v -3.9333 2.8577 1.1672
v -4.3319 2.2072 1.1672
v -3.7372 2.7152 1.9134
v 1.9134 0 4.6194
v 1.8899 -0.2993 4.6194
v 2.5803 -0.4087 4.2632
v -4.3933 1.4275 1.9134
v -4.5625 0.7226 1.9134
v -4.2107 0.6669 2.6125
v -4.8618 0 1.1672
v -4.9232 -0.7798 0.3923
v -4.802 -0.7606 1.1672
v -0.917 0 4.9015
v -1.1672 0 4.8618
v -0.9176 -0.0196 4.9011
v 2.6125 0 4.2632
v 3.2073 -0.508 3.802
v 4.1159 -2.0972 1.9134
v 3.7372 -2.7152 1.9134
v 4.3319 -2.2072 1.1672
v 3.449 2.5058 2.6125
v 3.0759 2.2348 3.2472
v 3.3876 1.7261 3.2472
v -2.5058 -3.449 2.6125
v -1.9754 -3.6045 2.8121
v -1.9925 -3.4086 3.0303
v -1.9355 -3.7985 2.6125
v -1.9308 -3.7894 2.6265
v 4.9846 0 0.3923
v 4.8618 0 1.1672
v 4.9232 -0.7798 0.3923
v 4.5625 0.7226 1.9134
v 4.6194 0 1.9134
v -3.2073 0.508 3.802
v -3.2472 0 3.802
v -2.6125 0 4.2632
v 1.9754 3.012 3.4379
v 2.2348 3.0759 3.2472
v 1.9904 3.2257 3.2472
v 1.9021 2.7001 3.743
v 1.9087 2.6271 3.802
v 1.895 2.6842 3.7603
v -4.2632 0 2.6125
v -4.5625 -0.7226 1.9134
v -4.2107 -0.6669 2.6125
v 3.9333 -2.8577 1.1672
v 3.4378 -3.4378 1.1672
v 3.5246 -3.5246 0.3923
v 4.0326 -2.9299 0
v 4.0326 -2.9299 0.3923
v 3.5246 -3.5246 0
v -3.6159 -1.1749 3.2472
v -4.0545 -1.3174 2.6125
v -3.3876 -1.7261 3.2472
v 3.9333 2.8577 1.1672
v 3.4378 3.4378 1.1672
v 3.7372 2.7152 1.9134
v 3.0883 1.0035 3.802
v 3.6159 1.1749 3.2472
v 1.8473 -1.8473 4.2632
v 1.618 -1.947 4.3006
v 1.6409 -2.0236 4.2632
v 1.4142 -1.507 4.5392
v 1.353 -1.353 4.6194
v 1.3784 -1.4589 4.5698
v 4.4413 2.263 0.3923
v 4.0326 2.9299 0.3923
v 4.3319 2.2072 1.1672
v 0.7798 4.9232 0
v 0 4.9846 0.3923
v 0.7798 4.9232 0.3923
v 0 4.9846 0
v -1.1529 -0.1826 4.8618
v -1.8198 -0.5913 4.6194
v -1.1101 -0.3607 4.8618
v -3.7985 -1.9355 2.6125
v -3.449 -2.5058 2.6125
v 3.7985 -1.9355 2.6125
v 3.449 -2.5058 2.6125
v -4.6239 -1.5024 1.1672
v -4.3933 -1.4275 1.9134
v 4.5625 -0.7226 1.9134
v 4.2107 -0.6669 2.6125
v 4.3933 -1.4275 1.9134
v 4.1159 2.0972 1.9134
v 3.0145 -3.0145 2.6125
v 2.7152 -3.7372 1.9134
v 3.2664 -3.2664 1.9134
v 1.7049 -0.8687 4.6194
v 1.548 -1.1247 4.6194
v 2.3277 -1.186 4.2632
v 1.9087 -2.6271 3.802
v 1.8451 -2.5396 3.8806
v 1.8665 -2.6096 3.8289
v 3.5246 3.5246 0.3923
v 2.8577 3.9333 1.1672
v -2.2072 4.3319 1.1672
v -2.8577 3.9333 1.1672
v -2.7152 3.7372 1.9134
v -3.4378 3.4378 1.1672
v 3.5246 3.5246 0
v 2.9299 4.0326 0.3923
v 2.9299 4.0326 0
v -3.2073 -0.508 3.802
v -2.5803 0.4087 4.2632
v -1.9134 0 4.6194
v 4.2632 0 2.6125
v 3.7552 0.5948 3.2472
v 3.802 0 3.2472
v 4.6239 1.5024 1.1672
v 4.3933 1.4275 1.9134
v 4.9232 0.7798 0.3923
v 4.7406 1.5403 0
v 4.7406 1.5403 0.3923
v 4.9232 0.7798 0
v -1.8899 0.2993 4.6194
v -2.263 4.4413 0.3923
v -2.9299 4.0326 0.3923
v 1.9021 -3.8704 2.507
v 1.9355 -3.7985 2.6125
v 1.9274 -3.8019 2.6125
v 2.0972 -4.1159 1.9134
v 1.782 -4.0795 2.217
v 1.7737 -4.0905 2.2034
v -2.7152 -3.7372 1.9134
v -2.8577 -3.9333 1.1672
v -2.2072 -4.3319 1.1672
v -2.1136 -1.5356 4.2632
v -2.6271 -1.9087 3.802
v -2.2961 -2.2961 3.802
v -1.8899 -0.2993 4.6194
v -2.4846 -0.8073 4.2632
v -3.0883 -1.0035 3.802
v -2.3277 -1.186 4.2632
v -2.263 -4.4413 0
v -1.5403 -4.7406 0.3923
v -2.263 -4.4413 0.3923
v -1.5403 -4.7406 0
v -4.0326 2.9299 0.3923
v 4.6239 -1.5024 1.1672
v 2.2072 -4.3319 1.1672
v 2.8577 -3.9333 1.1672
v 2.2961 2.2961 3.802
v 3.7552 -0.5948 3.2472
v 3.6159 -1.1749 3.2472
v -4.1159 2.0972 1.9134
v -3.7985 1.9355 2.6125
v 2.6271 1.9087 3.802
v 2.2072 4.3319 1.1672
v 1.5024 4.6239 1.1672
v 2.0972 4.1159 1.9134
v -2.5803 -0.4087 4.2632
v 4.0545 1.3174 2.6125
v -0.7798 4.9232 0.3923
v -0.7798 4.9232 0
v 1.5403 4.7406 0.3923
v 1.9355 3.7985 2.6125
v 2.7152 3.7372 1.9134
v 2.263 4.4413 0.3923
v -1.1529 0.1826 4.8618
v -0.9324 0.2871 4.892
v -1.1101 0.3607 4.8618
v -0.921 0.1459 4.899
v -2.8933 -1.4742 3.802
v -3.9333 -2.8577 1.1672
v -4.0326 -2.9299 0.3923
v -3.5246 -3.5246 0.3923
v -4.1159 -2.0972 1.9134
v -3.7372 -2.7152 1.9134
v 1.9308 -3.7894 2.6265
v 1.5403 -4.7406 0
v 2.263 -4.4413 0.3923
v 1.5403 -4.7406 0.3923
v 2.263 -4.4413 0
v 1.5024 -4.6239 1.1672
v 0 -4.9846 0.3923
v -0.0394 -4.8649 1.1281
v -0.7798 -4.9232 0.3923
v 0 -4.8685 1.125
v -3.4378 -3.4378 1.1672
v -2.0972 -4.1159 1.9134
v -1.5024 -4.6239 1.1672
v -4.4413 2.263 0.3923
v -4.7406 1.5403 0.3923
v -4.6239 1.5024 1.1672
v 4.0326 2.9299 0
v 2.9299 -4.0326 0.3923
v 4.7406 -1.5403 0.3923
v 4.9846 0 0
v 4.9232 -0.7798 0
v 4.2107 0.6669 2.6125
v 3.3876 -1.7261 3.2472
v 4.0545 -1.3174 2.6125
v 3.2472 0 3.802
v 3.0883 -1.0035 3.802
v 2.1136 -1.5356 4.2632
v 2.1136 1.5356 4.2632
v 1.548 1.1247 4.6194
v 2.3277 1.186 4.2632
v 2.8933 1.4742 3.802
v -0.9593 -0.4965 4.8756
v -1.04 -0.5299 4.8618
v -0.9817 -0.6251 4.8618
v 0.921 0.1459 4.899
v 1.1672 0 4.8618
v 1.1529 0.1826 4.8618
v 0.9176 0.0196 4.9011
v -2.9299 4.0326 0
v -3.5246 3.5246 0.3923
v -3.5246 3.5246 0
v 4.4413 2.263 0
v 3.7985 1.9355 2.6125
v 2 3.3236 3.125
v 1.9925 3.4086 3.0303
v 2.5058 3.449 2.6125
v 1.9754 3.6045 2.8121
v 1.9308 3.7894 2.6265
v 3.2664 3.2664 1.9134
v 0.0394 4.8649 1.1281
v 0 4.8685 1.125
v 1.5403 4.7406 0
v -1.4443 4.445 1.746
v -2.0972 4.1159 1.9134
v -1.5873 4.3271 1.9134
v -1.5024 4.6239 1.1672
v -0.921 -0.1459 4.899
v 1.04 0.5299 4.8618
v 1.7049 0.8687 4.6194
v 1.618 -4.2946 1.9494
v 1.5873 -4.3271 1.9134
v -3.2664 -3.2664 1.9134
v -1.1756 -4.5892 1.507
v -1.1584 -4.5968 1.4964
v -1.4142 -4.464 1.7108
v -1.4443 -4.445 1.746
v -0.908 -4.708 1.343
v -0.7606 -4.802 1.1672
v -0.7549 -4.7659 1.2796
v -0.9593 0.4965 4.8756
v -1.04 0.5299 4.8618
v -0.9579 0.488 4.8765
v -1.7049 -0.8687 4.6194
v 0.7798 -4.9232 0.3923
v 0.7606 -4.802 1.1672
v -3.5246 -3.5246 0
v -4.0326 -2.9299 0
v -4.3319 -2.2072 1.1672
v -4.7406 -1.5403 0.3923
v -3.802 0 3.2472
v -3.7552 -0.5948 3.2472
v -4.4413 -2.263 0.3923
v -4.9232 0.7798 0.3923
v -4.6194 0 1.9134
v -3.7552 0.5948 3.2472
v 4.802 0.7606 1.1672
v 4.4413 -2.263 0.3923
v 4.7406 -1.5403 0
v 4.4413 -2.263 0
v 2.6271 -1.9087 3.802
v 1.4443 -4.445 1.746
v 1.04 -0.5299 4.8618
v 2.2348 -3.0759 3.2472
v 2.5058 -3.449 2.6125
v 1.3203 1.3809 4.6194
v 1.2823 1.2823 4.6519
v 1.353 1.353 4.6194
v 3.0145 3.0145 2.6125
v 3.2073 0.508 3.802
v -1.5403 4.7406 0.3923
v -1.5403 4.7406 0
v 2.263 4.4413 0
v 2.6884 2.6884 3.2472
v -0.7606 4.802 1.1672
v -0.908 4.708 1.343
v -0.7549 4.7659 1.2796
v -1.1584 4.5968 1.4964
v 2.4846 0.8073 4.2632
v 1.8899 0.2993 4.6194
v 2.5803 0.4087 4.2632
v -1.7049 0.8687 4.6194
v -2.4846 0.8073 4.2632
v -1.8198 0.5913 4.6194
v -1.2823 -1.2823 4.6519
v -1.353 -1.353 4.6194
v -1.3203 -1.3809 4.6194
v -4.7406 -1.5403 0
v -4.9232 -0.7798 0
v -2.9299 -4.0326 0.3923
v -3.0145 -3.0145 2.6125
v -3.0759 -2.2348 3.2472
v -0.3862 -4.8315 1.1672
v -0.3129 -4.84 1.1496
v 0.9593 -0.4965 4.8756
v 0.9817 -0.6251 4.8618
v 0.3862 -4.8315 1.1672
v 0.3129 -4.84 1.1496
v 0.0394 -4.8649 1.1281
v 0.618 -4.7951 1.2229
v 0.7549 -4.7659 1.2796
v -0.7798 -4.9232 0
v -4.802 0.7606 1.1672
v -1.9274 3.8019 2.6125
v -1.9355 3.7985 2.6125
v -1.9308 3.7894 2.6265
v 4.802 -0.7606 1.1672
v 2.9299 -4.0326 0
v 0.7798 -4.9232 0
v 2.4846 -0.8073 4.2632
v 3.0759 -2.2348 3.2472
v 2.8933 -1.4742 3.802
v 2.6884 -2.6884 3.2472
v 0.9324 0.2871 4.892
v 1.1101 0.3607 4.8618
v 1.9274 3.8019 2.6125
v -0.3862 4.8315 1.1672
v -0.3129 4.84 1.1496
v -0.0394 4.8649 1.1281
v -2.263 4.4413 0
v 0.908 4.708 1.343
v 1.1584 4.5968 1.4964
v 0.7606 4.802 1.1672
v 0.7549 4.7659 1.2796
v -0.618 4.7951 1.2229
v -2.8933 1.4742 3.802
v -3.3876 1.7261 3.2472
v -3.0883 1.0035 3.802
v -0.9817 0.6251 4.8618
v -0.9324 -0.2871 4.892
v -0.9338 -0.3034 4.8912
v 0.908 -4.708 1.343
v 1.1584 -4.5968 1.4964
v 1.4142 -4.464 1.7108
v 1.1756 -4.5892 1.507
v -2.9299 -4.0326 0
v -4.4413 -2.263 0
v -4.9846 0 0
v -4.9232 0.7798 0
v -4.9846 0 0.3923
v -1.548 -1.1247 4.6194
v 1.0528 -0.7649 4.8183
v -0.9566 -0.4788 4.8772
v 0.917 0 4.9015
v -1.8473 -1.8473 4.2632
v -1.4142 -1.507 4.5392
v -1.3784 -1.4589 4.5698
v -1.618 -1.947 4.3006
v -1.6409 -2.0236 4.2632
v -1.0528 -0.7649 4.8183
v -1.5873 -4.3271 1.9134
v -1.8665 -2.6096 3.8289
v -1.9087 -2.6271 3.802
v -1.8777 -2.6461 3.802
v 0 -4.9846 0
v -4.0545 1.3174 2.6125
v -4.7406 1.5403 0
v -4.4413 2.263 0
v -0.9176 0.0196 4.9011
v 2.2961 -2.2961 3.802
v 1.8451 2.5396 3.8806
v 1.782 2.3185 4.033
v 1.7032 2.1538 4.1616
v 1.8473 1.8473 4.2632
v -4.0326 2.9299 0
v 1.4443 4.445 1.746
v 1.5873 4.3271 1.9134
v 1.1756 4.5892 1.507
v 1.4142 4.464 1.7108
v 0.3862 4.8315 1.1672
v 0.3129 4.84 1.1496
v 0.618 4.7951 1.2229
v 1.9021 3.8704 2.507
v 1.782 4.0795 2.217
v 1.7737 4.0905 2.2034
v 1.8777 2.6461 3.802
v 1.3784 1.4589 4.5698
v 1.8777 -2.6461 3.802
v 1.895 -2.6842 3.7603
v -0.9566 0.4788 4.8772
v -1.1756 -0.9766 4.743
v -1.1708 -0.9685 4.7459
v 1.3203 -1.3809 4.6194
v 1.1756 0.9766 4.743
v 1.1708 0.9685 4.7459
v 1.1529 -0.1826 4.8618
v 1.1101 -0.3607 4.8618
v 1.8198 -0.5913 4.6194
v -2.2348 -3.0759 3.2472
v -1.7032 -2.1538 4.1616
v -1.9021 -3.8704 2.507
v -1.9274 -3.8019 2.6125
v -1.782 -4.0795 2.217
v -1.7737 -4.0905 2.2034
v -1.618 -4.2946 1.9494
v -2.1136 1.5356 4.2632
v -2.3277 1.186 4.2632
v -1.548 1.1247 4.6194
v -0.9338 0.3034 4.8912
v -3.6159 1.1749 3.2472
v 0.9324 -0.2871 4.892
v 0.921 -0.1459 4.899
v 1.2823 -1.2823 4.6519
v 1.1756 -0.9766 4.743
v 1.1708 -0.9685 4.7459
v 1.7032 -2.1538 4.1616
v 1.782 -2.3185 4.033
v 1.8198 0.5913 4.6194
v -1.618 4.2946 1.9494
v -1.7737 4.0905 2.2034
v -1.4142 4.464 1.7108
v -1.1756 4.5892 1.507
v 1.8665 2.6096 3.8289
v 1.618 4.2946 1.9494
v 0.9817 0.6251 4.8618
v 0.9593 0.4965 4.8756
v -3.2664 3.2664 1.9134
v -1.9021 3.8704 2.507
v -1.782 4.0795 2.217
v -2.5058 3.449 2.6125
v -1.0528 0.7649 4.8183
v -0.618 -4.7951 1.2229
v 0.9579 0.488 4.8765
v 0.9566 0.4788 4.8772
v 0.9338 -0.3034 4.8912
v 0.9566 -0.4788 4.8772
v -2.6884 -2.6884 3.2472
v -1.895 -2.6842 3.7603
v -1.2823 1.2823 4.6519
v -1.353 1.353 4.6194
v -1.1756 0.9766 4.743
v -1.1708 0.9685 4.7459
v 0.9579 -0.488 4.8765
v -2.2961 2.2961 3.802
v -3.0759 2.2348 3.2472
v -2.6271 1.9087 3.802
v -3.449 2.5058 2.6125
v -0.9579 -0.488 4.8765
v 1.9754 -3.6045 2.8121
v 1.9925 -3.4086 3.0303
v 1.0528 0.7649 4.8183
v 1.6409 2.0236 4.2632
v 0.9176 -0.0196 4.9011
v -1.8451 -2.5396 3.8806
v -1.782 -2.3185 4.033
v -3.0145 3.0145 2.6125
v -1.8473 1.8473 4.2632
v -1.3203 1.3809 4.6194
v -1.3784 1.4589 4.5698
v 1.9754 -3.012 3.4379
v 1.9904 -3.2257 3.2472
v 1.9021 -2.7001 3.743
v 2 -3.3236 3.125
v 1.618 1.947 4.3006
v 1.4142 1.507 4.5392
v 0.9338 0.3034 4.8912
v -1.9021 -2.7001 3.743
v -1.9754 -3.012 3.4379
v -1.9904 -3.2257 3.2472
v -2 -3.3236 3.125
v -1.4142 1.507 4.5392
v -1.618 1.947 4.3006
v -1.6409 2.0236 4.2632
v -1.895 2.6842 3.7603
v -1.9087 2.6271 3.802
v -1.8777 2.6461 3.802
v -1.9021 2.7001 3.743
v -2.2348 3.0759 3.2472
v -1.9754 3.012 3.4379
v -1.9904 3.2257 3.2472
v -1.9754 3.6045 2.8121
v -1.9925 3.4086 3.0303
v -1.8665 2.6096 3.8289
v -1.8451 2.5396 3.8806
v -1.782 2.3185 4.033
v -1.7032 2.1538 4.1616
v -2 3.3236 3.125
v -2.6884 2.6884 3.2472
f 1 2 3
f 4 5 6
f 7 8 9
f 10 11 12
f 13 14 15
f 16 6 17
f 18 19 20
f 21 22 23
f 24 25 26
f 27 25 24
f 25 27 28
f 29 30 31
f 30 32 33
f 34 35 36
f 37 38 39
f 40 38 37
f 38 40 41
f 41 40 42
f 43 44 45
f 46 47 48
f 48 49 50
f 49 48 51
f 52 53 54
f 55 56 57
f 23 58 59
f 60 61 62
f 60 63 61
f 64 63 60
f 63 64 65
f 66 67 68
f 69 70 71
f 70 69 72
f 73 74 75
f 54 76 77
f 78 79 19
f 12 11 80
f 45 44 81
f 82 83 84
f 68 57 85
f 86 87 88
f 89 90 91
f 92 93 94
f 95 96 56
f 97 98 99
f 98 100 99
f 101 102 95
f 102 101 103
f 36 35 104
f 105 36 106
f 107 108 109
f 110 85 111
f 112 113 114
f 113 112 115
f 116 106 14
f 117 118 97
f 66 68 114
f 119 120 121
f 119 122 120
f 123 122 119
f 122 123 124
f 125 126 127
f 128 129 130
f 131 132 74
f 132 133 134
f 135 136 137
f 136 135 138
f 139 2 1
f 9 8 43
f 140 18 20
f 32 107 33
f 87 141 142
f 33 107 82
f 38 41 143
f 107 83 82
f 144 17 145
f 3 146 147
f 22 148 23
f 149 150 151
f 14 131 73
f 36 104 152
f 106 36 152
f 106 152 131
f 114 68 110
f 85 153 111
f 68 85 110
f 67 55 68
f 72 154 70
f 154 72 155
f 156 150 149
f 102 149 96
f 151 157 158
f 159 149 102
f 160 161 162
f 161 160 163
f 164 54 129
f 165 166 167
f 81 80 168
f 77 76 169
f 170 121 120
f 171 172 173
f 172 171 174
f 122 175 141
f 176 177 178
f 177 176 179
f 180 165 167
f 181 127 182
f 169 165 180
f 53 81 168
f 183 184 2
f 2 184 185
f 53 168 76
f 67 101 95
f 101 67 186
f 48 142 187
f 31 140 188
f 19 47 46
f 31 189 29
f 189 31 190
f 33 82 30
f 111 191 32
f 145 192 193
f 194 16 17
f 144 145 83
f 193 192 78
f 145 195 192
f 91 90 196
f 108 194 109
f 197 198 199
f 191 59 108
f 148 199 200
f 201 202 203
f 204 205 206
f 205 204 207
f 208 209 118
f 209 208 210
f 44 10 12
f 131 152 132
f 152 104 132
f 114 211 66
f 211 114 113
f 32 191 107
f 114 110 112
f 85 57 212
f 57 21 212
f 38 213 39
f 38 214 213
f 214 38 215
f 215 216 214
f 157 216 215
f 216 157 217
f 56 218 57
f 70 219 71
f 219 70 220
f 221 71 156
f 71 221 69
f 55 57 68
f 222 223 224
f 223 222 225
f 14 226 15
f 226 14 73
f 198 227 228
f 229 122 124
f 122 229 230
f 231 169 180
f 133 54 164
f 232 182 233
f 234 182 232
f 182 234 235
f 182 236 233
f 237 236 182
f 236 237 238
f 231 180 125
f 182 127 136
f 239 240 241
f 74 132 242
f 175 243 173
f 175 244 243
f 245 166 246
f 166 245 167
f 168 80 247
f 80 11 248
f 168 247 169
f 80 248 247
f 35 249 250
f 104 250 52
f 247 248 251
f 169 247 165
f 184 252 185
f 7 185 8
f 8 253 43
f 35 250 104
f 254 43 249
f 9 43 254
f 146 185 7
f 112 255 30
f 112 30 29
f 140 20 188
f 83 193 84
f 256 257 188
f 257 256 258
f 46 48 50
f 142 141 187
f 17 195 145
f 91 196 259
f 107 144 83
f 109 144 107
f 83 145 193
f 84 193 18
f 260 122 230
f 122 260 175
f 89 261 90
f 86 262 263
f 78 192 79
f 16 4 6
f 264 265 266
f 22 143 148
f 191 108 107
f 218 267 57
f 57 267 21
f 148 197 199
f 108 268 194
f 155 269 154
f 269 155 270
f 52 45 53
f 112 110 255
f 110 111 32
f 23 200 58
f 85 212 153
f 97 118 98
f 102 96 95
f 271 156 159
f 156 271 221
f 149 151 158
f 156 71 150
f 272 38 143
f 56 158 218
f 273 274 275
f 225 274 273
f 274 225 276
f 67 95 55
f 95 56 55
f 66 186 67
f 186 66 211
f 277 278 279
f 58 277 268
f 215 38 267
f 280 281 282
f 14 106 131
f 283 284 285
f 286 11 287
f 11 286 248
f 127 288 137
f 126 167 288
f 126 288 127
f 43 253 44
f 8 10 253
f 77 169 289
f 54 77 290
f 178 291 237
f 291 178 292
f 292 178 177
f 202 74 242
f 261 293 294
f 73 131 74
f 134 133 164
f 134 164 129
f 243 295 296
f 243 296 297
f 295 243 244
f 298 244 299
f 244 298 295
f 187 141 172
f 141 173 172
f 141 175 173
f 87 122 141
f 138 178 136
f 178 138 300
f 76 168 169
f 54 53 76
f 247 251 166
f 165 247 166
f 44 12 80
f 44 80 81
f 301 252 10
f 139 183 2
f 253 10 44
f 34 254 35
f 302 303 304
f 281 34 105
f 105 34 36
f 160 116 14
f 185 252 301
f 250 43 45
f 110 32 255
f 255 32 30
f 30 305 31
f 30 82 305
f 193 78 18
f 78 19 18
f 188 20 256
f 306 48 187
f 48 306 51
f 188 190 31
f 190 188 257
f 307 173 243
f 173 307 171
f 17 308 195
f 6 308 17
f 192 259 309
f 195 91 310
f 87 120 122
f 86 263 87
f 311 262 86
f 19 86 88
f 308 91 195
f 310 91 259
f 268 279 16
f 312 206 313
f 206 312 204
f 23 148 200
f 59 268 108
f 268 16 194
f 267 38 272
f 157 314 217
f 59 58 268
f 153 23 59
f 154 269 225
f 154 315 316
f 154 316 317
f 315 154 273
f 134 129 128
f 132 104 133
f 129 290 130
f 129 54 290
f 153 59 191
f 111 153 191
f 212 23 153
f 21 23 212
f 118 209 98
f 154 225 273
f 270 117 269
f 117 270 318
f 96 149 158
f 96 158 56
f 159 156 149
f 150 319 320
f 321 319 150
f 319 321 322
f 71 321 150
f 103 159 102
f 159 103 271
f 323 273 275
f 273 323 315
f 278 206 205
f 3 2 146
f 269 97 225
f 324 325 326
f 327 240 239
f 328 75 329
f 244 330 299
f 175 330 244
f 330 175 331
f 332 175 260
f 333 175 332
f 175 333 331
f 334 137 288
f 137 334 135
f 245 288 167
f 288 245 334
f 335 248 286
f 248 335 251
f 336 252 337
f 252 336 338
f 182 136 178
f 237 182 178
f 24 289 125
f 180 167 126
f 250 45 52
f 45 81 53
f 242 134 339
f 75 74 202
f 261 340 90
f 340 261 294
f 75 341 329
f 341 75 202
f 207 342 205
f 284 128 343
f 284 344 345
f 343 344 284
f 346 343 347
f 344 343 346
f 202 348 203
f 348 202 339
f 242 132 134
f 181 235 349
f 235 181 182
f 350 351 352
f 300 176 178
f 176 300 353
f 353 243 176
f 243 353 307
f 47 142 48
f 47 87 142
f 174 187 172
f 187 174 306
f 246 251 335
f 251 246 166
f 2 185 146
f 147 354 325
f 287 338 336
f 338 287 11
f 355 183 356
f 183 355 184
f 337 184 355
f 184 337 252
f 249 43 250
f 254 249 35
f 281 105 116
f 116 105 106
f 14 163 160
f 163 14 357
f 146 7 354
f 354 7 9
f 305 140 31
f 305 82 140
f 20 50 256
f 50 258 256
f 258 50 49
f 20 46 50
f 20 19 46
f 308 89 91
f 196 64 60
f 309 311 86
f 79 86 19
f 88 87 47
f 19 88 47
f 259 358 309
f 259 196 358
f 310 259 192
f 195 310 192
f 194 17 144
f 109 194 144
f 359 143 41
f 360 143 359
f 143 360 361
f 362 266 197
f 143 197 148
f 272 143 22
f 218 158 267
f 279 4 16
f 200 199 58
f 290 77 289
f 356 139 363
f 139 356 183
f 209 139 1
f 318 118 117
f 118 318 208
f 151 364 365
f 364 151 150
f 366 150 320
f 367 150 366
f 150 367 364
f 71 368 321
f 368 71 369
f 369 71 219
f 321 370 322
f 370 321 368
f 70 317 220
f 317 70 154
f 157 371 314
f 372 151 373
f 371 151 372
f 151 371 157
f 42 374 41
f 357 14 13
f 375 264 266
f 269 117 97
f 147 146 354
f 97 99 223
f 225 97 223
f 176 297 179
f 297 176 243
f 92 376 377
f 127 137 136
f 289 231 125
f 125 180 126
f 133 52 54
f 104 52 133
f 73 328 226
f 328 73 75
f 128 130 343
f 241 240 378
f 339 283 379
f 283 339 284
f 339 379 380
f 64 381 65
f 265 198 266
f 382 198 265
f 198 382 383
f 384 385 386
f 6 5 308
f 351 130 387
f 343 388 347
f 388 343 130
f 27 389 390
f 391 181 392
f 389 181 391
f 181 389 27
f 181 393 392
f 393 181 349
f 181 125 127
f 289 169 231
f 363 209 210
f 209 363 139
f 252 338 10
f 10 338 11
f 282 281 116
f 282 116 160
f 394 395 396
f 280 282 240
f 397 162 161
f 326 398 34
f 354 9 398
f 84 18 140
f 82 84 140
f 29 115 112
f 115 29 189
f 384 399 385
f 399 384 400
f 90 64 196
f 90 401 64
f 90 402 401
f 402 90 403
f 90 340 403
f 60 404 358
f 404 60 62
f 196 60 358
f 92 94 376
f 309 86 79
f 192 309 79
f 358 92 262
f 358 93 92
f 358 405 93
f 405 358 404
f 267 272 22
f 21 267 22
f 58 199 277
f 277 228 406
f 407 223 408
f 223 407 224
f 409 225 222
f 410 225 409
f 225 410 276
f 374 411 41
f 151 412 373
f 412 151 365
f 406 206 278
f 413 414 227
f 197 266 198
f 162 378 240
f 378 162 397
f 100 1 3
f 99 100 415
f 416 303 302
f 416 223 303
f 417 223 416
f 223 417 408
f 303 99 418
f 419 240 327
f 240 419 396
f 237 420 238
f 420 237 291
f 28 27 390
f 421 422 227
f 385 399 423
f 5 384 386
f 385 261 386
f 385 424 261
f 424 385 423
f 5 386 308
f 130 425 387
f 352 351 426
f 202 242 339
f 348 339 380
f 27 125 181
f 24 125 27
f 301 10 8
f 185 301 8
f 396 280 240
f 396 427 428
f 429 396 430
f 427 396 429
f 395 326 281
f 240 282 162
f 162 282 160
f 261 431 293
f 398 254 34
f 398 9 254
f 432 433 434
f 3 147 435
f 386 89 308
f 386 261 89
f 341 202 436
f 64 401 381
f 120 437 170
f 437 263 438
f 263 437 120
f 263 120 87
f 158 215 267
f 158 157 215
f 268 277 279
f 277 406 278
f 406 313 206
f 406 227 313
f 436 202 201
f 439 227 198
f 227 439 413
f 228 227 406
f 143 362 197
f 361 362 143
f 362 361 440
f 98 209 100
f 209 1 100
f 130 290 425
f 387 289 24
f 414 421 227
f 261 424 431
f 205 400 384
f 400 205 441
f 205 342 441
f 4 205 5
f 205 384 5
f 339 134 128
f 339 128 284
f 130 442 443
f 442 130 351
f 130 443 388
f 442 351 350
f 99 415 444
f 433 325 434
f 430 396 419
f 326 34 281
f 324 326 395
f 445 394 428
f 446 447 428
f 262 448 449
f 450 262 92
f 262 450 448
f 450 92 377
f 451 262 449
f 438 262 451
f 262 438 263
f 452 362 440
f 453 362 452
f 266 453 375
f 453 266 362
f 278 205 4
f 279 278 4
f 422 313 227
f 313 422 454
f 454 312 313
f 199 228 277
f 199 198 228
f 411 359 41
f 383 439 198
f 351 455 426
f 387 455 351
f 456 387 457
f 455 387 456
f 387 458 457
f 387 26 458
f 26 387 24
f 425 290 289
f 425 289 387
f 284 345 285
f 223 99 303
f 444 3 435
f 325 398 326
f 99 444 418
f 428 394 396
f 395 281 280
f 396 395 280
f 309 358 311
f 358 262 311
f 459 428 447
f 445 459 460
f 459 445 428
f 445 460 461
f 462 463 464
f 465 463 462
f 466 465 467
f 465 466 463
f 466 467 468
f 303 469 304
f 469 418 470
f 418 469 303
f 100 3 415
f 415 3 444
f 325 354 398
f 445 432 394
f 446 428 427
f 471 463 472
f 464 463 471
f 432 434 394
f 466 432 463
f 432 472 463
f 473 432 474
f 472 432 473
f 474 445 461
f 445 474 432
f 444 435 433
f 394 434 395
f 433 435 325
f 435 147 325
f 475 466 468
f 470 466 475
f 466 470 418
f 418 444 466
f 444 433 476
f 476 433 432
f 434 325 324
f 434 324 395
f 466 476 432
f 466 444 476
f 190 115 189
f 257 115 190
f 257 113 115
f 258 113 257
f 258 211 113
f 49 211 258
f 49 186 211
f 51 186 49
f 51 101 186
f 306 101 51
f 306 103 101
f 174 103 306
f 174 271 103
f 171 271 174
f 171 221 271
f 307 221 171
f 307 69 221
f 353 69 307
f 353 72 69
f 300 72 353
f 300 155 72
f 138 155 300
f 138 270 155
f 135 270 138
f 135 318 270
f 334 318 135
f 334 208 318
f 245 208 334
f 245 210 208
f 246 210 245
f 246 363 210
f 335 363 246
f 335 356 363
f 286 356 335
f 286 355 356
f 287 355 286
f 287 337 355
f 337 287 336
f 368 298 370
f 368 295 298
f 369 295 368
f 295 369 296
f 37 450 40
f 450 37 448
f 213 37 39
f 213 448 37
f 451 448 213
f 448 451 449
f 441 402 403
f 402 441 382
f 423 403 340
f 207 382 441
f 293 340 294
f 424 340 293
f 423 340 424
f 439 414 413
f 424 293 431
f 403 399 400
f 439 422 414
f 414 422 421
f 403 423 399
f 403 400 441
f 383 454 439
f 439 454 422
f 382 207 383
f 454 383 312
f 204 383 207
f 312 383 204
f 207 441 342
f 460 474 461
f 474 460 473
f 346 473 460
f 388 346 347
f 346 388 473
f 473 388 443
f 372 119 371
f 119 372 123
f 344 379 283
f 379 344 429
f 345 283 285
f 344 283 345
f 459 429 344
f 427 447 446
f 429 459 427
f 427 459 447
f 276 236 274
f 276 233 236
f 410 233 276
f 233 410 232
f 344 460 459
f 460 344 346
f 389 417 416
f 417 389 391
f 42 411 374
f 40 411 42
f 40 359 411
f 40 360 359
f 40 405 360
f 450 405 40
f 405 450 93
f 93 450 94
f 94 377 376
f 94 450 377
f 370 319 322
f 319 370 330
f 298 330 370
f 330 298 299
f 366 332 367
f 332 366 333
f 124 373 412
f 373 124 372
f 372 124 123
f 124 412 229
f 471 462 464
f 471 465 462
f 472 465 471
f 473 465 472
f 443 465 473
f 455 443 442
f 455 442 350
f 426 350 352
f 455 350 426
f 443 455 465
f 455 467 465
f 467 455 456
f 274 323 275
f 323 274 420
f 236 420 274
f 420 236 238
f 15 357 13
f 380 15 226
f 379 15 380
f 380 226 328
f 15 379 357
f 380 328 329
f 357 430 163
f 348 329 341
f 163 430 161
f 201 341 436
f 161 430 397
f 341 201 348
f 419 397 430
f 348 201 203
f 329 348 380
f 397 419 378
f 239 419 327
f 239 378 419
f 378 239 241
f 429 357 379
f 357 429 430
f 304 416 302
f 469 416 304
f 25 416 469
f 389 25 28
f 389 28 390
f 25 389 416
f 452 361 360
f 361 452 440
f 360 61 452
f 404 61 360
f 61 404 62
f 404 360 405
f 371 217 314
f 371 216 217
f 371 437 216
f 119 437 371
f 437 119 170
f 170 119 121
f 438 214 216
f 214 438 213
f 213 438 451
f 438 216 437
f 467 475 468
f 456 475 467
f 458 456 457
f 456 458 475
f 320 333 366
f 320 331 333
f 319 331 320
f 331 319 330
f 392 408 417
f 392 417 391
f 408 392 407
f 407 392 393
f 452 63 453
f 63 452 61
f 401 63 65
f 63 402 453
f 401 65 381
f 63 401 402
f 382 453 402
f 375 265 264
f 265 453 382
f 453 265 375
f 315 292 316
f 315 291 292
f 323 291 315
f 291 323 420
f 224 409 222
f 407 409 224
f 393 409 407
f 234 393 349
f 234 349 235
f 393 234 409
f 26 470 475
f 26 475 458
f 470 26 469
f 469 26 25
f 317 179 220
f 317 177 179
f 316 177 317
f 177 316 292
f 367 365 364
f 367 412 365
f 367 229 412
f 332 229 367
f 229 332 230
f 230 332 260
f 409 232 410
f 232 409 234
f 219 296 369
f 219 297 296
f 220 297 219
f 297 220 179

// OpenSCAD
///< Cable management

///< module parameters
sphere_r = 5;
sphere_d = sphere_r * 2;
print_finish = 40;

///< modules
module half_sphere( r ){
     w = r*2;
     difference(){
     sphere( r, $fn=print_finish );
     translate([0,0,-r/2])
	  color([1,0,0],0.5)cube( [w, w, r], true);
     }
}

module cable_channel( r, h ){
     color([0,1,0])cylinder( r = r, h=h, $fn=print_finish );
}

module cable_sphere( r, ch_d ) {
     d = r*2;
    difference(){
         color([1,0,0],0.5)half_sphere( r );
         translate([0,r,r/1.6])rotate([90,0,0])cable_channel( ch_d, d );
    }
}

cable_sphere( sphere_r, 2 );
